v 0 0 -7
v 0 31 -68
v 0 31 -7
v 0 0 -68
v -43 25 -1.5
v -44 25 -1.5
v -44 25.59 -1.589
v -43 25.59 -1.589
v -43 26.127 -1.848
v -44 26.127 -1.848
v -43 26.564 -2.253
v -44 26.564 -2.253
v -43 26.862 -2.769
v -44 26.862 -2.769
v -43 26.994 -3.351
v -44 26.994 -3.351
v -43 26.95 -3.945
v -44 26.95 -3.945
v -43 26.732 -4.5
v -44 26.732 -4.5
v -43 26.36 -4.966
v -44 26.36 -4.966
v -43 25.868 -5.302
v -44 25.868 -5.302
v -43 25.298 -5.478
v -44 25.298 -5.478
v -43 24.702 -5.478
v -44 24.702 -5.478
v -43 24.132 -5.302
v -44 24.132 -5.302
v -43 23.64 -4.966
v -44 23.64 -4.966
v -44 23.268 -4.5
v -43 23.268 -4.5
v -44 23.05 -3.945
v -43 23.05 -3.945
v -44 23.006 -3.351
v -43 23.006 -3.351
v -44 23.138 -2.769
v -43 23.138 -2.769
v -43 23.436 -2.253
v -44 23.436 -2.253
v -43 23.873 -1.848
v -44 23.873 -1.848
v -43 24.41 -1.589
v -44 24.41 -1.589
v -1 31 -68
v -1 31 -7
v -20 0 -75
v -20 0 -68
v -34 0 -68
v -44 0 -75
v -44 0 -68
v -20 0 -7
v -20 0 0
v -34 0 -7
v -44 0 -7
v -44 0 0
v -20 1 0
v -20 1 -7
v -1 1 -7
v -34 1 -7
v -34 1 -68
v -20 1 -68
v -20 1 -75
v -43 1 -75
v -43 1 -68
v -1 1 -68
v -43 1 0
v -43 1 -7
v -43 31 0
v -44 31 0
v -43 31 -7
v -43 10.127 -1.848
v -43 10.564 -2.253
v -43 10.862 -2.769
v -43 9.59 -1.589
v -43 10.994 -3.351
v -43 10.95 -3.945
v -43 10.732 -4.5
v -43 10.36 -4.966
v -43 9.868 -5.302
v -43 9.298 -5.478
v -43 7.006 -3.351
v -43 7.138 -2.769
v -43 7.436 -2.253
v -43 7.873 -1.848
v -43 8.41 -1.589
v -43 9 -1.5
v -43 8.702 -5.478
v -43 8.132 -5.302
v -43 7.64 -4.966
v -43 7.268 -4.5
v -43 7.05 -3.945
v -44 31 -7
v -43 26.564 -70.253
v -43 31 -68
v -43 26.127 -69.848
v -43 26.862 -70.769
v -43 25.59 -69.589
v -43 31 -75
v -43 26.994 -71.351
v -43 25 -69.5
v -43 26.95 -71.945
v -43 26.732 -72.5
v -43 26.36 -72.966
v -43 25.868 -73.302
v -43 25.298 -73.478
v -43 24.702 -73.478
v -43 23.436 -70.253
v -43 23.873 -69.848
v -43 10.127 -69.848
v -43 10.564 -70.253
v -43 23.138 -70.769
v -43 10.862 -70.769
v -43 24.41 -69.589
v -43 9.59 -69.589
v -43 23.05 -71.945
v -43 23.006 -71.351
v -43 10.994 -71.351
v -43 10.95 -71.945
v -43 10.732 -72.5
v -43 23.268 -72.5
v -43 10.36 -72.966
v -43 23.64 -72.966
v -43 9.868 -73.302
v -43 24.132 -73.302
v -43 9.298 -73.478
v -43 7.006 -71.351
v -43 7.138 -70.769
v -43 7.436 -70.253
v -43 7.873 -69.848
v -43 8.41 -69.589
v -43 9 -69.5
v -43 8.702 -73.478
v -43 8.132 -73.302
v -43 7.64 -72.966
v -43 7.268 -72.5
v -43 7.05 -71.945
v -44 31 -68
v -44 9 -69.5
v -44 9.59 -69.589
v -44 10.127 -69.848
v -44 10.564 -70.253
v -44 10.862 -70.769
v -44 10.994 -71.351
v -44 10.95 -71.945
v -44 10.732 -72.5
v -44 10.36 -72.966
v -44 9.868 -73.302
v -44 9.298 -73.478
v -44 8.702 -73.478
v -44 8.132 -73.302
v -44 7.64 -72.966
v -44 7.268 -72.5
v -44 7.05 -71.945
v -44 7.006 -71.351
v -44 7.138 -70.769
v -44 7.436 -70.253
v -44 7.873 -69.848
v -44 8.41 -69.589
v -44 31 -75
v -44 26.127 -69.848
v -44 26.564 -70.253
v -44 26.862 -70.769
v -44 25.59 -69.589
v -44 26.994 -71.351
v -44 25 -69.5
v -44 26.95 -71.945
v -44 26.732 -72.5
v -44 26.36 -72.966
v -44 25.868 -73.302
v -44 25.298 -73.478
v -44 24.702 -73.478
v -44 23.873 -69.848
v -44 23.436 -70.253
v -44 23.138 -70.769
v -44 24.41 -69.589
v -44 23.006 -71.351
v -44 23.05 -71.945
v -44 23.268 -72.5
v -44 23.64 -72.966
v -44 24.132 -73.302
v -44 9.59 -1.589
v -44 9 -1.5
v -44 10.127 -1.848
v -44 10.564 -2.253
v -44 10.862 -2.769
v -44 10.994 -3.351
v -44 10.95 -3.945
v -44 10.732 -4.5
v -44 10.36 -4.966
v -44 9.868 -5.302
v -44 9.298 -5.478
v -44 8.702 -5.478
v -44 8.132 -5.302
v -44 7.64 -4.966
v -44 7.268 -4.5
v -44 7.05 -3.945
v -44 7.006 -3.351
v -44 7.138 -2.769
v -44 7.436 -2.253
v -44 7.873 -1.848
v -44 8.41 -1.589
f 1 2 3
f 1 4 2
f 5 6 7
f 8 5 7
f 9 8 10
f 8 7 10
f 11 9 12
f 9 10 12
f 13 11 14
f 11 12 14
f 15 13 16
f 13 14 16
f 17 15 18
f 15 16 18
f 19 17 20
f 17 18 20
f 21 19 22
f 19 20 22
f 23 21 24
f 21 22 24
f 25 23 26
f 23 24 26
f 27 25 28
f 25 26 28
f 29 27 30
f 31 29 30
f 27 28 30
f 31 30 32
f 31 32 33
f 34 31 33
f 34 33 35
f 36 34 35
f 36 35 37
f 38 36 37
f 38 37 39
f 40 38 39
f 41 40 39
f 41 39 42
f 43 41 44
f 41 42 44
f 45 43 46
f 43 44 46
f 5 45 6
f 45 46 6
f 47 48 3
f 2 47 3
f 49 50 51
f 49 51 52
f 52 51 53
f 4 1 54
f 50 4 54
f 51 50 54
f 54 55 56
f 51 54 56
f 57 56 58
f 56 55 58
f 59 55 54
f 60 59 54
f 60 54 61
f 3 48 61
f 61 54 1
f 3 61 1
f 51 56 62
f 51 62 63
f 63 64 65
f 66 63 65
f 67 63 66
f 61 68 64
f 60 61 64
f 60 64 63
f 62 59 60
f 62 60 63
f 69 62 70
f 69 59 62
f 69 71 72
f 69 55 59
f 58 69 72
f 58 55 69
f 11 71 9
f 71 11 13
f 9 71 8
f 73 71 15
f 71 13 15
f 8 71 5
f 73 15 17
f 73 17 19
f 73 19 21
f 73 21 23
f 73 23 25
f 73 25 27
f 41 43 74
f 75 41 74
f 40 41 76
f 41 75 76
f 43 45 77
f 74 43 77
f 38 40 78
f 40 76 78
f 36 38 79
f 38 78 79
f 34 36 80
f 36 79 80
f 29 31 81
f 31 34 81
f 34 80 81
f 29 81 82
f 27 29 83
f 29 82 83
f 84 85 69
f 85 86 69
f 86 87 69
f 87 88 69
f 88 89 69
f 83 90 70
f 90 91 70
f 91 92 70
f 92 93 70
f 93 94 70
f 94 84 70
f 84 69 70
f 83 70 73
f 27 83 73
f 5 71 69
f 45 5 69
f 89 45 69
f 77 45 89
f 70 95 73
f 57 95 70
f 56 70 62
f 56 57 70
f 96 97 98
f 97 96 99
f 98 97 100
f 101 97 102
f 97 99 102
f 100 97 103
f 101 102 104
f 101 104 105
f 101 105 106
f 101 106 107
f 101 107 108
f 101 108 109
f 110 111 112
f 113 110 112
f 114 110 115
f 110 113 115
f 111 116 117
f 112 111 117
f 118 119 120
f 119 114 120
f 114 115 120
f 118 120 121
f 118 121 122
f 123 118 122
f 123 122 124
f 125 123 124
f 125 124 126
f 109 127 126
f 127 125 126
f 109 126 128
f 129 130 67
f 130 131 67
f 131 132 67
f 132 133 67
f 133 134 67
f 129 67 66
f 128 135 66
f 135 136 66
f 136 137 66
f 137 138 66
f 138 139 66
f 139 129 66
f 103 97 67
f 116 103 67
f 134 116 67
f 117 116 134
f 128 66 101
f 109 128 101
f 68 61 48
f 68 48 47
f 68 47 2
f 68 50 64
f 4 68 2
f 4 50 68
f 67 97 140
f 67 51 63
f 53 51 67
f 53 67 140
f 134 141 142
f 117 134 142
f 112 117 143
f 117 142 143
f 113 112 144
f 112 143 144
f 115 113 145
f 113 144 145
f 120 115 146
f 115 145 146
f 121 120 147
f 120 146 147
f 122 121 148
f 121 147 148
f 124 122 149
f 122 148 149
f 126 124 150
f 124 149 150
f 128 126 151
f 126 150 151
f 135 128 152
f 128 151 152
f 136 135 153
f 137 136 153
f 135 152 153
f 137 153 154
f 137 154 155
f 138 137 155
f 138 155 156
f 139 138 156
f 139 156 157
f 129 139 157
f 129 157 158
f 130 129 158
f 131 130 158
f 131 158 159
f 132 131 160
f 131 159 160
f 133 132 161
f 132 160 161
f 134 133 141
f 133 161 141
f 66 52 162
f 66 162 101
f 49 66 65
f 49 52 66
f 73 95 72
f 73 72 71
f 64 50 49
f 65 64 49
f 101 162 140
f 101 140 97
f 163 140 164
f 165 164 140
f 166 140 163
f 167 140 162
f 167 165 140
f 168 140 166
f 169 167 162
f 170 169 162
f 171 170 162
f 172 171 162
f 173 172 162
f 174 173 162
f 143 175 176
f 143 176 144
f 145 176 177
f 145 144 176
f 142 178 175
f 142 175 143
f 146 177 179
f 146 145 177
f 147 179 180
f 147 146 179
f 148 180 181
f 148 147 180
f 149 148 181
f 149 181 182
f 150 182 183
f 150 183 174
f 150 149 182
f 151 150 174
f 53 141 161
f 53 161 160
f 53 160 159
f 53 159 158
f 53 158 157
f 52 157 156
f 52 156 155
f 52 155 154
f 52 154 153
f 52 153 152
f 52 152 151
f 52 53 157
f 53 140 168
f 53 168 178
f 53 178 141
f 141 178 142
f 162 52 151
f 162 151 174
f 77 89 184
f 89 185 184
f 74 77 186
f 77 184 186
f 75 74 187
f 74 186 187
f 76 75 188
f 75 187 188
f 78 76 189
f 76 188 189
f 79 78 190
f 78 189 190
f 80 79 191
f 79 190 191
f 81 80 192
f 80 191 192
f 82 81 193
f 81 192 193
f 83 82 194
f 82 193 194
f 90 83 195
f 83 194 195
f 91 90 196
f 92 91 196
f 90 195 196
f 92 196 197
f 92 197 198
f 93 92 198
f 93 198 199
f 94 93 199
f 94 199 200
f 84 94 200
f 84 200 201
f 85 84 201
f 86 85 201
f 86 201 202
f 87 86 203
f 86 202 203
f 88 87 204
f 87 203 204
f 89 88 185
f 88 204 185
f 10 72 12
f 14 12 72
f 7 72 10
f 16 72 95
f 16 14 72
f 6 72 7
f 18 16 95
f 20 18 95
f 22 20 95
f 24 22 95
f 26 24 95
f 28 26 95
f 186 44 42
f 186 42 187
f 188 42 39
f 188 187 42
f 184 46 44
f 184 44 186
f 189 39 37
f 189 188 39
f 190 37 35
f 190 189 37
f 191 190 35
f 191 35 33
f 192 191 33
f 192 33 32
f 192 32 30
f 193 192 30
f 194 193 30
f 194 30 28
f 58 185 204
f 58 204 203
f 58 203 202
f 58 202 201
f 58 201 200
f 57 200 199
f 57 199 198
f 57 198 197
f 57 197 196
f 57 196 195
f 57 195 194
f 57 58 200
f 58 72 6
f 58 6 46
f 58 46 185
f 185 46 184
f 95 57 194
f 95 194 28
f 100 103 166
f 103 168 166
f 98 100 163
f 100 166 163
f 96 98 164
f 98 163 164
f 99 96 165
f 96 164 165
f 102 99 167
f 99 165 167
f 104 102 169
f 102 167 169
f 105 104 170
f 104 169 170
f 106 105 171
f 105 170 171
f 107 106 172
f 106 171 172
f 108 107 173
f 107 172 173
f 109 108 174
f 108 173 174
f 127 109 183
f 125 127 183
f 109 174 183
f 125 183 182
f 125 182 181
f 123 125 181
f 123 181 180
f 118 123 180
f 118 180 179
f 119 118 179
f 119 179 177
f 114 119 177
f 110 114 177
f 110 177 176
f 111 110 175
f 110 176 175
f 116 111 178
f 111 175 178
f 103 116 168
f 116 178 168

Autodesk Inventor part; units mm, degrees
ref_plane "YZ Plane" through (0, 0, 0) normal (1, 0, 0) x (0, 1, 0)
ref_plane "XZ Plane" through (0, 0, 0) normal (0, 1, 0) x (-1, 0, 0)
ref_plane "XY Plane" through (0, 0, 0) normal (0, 0, 1) x (1, 0, 0)
sketch "Sketch1" plane through (0, 0, 0) normal (0, 1, 0) x (-1, 0, 0)
  line L0 (0, 0) -> (44, 0)
  line L1 (44, -75) -> (20, -75)
  line L2 (0, -75) -> (0, -7)
  line L3 (44, 0) -> (44, -7)
  line L4 (44, -7) -> (34, -7)
  line L5 (34, -7) -> (34, -68)
  line L6 (34, -68) -> (44, -68)
  line L7 (44, 0) -> (44, -7)
  line L8 (44, -68) -> (44, -75)
  line L9 (0, 0) -> (20, 0)
  line L10 (20, 0) -> (20, -7)
  line L11 (20, -7) -> (0, -7)
  line L12 (20, -68) -> (20, -75)
  line L13 (20, -68) -> (0, -68)
  dimension "d0" = 44
  dimension "d1" = 75
  dimension "d2" = 7
  dimension "d3" = 10
  dimension "d4" = 61
  dimension "d5" = 20
extrude "Extrusion1" add sketch "Sketch1" along normal blind 1
sketch "Sketch2" plane through (0, 1, 0) normal (0, 1, 0) x (1, 0, 0)
  line L0 (0, 68) -> (-20, 68) projected
  line L1 (-20, 75) -> (-44, 75) projected
  line L2 (-34, 7) -> (-44, 7) projected
  line L3 (-44, 0) -> (-43, 0)
  line L4 (-43, 0) -> (-43, 7)
  line L5 (-43, 7) -> (-44, 7)
  line L6 (-44, 7) -> (-44, 0)
  line L7 (-44, 68) -> (-43, 68)
  line L8 (-43, 68) -> (-43, 75)
  line L9 (-43, 75) -> (-44, 75)
  line L10 (-44, 75) -> (-44, 68)
  line L11 (0, 7) -> (-1, 7)
  line L12 (-1, 7) -> (-1, 68)
  line L13 (-1, 68) -> (0, 68)
  line L14 (0, 68) -> (0, 7)
  point P0 (0, 0)
  dimension "d8" = 1
  dimension "d9" = 1
  dimension "d10" = 1
extrude "Extrusion2" add sketch "Sketch2" along normal blind 30
sketch "Sketch3" plane through (-44, 0, -7) normal (-1, 0, 0) x (0, 0, 1)
  line L0 (0, 31) -> (7, 31) projected
  line L1 (3.5, 31) -> (3.5, 25)
  line L2 (3.5, 25) -> (3.5, 9)
  circle A0 centre (3.5, 25) radius 2
  circle A1 centre (3.5, 9) radius 2
  dimension "d13" = 6
  dimension "d14" = 16
  dimension "d15" = 4
  dimension "d16" = 4
extrude "Extrusion3" cut sketch "Sketch3" against normal blind 30
sketch "Sketch4" plane through (-44, 0, -75) normal (-1, 0, 0) x (0, 0, 1)
  line L0 (7, 31) -> (0, 31) projected
  line L1 (3.5, 31) -> (3.5, 25)
  line L2 (3.5, 25) -> (3.5, 9)
  circle A0 centre (3.5, 25) radius 2
  circle A1 centre (3.5, 9) radius 2
  point P0 (75, 0)
  dimension "d19" = 6
  dimension "d20" = 16
  dimension "d21" = 4
  dimension "d22" = 4
extrude "Extrusion4" cut sketch "Sketch4" against normal blind 30
properties part number "Shoulder Plate"
